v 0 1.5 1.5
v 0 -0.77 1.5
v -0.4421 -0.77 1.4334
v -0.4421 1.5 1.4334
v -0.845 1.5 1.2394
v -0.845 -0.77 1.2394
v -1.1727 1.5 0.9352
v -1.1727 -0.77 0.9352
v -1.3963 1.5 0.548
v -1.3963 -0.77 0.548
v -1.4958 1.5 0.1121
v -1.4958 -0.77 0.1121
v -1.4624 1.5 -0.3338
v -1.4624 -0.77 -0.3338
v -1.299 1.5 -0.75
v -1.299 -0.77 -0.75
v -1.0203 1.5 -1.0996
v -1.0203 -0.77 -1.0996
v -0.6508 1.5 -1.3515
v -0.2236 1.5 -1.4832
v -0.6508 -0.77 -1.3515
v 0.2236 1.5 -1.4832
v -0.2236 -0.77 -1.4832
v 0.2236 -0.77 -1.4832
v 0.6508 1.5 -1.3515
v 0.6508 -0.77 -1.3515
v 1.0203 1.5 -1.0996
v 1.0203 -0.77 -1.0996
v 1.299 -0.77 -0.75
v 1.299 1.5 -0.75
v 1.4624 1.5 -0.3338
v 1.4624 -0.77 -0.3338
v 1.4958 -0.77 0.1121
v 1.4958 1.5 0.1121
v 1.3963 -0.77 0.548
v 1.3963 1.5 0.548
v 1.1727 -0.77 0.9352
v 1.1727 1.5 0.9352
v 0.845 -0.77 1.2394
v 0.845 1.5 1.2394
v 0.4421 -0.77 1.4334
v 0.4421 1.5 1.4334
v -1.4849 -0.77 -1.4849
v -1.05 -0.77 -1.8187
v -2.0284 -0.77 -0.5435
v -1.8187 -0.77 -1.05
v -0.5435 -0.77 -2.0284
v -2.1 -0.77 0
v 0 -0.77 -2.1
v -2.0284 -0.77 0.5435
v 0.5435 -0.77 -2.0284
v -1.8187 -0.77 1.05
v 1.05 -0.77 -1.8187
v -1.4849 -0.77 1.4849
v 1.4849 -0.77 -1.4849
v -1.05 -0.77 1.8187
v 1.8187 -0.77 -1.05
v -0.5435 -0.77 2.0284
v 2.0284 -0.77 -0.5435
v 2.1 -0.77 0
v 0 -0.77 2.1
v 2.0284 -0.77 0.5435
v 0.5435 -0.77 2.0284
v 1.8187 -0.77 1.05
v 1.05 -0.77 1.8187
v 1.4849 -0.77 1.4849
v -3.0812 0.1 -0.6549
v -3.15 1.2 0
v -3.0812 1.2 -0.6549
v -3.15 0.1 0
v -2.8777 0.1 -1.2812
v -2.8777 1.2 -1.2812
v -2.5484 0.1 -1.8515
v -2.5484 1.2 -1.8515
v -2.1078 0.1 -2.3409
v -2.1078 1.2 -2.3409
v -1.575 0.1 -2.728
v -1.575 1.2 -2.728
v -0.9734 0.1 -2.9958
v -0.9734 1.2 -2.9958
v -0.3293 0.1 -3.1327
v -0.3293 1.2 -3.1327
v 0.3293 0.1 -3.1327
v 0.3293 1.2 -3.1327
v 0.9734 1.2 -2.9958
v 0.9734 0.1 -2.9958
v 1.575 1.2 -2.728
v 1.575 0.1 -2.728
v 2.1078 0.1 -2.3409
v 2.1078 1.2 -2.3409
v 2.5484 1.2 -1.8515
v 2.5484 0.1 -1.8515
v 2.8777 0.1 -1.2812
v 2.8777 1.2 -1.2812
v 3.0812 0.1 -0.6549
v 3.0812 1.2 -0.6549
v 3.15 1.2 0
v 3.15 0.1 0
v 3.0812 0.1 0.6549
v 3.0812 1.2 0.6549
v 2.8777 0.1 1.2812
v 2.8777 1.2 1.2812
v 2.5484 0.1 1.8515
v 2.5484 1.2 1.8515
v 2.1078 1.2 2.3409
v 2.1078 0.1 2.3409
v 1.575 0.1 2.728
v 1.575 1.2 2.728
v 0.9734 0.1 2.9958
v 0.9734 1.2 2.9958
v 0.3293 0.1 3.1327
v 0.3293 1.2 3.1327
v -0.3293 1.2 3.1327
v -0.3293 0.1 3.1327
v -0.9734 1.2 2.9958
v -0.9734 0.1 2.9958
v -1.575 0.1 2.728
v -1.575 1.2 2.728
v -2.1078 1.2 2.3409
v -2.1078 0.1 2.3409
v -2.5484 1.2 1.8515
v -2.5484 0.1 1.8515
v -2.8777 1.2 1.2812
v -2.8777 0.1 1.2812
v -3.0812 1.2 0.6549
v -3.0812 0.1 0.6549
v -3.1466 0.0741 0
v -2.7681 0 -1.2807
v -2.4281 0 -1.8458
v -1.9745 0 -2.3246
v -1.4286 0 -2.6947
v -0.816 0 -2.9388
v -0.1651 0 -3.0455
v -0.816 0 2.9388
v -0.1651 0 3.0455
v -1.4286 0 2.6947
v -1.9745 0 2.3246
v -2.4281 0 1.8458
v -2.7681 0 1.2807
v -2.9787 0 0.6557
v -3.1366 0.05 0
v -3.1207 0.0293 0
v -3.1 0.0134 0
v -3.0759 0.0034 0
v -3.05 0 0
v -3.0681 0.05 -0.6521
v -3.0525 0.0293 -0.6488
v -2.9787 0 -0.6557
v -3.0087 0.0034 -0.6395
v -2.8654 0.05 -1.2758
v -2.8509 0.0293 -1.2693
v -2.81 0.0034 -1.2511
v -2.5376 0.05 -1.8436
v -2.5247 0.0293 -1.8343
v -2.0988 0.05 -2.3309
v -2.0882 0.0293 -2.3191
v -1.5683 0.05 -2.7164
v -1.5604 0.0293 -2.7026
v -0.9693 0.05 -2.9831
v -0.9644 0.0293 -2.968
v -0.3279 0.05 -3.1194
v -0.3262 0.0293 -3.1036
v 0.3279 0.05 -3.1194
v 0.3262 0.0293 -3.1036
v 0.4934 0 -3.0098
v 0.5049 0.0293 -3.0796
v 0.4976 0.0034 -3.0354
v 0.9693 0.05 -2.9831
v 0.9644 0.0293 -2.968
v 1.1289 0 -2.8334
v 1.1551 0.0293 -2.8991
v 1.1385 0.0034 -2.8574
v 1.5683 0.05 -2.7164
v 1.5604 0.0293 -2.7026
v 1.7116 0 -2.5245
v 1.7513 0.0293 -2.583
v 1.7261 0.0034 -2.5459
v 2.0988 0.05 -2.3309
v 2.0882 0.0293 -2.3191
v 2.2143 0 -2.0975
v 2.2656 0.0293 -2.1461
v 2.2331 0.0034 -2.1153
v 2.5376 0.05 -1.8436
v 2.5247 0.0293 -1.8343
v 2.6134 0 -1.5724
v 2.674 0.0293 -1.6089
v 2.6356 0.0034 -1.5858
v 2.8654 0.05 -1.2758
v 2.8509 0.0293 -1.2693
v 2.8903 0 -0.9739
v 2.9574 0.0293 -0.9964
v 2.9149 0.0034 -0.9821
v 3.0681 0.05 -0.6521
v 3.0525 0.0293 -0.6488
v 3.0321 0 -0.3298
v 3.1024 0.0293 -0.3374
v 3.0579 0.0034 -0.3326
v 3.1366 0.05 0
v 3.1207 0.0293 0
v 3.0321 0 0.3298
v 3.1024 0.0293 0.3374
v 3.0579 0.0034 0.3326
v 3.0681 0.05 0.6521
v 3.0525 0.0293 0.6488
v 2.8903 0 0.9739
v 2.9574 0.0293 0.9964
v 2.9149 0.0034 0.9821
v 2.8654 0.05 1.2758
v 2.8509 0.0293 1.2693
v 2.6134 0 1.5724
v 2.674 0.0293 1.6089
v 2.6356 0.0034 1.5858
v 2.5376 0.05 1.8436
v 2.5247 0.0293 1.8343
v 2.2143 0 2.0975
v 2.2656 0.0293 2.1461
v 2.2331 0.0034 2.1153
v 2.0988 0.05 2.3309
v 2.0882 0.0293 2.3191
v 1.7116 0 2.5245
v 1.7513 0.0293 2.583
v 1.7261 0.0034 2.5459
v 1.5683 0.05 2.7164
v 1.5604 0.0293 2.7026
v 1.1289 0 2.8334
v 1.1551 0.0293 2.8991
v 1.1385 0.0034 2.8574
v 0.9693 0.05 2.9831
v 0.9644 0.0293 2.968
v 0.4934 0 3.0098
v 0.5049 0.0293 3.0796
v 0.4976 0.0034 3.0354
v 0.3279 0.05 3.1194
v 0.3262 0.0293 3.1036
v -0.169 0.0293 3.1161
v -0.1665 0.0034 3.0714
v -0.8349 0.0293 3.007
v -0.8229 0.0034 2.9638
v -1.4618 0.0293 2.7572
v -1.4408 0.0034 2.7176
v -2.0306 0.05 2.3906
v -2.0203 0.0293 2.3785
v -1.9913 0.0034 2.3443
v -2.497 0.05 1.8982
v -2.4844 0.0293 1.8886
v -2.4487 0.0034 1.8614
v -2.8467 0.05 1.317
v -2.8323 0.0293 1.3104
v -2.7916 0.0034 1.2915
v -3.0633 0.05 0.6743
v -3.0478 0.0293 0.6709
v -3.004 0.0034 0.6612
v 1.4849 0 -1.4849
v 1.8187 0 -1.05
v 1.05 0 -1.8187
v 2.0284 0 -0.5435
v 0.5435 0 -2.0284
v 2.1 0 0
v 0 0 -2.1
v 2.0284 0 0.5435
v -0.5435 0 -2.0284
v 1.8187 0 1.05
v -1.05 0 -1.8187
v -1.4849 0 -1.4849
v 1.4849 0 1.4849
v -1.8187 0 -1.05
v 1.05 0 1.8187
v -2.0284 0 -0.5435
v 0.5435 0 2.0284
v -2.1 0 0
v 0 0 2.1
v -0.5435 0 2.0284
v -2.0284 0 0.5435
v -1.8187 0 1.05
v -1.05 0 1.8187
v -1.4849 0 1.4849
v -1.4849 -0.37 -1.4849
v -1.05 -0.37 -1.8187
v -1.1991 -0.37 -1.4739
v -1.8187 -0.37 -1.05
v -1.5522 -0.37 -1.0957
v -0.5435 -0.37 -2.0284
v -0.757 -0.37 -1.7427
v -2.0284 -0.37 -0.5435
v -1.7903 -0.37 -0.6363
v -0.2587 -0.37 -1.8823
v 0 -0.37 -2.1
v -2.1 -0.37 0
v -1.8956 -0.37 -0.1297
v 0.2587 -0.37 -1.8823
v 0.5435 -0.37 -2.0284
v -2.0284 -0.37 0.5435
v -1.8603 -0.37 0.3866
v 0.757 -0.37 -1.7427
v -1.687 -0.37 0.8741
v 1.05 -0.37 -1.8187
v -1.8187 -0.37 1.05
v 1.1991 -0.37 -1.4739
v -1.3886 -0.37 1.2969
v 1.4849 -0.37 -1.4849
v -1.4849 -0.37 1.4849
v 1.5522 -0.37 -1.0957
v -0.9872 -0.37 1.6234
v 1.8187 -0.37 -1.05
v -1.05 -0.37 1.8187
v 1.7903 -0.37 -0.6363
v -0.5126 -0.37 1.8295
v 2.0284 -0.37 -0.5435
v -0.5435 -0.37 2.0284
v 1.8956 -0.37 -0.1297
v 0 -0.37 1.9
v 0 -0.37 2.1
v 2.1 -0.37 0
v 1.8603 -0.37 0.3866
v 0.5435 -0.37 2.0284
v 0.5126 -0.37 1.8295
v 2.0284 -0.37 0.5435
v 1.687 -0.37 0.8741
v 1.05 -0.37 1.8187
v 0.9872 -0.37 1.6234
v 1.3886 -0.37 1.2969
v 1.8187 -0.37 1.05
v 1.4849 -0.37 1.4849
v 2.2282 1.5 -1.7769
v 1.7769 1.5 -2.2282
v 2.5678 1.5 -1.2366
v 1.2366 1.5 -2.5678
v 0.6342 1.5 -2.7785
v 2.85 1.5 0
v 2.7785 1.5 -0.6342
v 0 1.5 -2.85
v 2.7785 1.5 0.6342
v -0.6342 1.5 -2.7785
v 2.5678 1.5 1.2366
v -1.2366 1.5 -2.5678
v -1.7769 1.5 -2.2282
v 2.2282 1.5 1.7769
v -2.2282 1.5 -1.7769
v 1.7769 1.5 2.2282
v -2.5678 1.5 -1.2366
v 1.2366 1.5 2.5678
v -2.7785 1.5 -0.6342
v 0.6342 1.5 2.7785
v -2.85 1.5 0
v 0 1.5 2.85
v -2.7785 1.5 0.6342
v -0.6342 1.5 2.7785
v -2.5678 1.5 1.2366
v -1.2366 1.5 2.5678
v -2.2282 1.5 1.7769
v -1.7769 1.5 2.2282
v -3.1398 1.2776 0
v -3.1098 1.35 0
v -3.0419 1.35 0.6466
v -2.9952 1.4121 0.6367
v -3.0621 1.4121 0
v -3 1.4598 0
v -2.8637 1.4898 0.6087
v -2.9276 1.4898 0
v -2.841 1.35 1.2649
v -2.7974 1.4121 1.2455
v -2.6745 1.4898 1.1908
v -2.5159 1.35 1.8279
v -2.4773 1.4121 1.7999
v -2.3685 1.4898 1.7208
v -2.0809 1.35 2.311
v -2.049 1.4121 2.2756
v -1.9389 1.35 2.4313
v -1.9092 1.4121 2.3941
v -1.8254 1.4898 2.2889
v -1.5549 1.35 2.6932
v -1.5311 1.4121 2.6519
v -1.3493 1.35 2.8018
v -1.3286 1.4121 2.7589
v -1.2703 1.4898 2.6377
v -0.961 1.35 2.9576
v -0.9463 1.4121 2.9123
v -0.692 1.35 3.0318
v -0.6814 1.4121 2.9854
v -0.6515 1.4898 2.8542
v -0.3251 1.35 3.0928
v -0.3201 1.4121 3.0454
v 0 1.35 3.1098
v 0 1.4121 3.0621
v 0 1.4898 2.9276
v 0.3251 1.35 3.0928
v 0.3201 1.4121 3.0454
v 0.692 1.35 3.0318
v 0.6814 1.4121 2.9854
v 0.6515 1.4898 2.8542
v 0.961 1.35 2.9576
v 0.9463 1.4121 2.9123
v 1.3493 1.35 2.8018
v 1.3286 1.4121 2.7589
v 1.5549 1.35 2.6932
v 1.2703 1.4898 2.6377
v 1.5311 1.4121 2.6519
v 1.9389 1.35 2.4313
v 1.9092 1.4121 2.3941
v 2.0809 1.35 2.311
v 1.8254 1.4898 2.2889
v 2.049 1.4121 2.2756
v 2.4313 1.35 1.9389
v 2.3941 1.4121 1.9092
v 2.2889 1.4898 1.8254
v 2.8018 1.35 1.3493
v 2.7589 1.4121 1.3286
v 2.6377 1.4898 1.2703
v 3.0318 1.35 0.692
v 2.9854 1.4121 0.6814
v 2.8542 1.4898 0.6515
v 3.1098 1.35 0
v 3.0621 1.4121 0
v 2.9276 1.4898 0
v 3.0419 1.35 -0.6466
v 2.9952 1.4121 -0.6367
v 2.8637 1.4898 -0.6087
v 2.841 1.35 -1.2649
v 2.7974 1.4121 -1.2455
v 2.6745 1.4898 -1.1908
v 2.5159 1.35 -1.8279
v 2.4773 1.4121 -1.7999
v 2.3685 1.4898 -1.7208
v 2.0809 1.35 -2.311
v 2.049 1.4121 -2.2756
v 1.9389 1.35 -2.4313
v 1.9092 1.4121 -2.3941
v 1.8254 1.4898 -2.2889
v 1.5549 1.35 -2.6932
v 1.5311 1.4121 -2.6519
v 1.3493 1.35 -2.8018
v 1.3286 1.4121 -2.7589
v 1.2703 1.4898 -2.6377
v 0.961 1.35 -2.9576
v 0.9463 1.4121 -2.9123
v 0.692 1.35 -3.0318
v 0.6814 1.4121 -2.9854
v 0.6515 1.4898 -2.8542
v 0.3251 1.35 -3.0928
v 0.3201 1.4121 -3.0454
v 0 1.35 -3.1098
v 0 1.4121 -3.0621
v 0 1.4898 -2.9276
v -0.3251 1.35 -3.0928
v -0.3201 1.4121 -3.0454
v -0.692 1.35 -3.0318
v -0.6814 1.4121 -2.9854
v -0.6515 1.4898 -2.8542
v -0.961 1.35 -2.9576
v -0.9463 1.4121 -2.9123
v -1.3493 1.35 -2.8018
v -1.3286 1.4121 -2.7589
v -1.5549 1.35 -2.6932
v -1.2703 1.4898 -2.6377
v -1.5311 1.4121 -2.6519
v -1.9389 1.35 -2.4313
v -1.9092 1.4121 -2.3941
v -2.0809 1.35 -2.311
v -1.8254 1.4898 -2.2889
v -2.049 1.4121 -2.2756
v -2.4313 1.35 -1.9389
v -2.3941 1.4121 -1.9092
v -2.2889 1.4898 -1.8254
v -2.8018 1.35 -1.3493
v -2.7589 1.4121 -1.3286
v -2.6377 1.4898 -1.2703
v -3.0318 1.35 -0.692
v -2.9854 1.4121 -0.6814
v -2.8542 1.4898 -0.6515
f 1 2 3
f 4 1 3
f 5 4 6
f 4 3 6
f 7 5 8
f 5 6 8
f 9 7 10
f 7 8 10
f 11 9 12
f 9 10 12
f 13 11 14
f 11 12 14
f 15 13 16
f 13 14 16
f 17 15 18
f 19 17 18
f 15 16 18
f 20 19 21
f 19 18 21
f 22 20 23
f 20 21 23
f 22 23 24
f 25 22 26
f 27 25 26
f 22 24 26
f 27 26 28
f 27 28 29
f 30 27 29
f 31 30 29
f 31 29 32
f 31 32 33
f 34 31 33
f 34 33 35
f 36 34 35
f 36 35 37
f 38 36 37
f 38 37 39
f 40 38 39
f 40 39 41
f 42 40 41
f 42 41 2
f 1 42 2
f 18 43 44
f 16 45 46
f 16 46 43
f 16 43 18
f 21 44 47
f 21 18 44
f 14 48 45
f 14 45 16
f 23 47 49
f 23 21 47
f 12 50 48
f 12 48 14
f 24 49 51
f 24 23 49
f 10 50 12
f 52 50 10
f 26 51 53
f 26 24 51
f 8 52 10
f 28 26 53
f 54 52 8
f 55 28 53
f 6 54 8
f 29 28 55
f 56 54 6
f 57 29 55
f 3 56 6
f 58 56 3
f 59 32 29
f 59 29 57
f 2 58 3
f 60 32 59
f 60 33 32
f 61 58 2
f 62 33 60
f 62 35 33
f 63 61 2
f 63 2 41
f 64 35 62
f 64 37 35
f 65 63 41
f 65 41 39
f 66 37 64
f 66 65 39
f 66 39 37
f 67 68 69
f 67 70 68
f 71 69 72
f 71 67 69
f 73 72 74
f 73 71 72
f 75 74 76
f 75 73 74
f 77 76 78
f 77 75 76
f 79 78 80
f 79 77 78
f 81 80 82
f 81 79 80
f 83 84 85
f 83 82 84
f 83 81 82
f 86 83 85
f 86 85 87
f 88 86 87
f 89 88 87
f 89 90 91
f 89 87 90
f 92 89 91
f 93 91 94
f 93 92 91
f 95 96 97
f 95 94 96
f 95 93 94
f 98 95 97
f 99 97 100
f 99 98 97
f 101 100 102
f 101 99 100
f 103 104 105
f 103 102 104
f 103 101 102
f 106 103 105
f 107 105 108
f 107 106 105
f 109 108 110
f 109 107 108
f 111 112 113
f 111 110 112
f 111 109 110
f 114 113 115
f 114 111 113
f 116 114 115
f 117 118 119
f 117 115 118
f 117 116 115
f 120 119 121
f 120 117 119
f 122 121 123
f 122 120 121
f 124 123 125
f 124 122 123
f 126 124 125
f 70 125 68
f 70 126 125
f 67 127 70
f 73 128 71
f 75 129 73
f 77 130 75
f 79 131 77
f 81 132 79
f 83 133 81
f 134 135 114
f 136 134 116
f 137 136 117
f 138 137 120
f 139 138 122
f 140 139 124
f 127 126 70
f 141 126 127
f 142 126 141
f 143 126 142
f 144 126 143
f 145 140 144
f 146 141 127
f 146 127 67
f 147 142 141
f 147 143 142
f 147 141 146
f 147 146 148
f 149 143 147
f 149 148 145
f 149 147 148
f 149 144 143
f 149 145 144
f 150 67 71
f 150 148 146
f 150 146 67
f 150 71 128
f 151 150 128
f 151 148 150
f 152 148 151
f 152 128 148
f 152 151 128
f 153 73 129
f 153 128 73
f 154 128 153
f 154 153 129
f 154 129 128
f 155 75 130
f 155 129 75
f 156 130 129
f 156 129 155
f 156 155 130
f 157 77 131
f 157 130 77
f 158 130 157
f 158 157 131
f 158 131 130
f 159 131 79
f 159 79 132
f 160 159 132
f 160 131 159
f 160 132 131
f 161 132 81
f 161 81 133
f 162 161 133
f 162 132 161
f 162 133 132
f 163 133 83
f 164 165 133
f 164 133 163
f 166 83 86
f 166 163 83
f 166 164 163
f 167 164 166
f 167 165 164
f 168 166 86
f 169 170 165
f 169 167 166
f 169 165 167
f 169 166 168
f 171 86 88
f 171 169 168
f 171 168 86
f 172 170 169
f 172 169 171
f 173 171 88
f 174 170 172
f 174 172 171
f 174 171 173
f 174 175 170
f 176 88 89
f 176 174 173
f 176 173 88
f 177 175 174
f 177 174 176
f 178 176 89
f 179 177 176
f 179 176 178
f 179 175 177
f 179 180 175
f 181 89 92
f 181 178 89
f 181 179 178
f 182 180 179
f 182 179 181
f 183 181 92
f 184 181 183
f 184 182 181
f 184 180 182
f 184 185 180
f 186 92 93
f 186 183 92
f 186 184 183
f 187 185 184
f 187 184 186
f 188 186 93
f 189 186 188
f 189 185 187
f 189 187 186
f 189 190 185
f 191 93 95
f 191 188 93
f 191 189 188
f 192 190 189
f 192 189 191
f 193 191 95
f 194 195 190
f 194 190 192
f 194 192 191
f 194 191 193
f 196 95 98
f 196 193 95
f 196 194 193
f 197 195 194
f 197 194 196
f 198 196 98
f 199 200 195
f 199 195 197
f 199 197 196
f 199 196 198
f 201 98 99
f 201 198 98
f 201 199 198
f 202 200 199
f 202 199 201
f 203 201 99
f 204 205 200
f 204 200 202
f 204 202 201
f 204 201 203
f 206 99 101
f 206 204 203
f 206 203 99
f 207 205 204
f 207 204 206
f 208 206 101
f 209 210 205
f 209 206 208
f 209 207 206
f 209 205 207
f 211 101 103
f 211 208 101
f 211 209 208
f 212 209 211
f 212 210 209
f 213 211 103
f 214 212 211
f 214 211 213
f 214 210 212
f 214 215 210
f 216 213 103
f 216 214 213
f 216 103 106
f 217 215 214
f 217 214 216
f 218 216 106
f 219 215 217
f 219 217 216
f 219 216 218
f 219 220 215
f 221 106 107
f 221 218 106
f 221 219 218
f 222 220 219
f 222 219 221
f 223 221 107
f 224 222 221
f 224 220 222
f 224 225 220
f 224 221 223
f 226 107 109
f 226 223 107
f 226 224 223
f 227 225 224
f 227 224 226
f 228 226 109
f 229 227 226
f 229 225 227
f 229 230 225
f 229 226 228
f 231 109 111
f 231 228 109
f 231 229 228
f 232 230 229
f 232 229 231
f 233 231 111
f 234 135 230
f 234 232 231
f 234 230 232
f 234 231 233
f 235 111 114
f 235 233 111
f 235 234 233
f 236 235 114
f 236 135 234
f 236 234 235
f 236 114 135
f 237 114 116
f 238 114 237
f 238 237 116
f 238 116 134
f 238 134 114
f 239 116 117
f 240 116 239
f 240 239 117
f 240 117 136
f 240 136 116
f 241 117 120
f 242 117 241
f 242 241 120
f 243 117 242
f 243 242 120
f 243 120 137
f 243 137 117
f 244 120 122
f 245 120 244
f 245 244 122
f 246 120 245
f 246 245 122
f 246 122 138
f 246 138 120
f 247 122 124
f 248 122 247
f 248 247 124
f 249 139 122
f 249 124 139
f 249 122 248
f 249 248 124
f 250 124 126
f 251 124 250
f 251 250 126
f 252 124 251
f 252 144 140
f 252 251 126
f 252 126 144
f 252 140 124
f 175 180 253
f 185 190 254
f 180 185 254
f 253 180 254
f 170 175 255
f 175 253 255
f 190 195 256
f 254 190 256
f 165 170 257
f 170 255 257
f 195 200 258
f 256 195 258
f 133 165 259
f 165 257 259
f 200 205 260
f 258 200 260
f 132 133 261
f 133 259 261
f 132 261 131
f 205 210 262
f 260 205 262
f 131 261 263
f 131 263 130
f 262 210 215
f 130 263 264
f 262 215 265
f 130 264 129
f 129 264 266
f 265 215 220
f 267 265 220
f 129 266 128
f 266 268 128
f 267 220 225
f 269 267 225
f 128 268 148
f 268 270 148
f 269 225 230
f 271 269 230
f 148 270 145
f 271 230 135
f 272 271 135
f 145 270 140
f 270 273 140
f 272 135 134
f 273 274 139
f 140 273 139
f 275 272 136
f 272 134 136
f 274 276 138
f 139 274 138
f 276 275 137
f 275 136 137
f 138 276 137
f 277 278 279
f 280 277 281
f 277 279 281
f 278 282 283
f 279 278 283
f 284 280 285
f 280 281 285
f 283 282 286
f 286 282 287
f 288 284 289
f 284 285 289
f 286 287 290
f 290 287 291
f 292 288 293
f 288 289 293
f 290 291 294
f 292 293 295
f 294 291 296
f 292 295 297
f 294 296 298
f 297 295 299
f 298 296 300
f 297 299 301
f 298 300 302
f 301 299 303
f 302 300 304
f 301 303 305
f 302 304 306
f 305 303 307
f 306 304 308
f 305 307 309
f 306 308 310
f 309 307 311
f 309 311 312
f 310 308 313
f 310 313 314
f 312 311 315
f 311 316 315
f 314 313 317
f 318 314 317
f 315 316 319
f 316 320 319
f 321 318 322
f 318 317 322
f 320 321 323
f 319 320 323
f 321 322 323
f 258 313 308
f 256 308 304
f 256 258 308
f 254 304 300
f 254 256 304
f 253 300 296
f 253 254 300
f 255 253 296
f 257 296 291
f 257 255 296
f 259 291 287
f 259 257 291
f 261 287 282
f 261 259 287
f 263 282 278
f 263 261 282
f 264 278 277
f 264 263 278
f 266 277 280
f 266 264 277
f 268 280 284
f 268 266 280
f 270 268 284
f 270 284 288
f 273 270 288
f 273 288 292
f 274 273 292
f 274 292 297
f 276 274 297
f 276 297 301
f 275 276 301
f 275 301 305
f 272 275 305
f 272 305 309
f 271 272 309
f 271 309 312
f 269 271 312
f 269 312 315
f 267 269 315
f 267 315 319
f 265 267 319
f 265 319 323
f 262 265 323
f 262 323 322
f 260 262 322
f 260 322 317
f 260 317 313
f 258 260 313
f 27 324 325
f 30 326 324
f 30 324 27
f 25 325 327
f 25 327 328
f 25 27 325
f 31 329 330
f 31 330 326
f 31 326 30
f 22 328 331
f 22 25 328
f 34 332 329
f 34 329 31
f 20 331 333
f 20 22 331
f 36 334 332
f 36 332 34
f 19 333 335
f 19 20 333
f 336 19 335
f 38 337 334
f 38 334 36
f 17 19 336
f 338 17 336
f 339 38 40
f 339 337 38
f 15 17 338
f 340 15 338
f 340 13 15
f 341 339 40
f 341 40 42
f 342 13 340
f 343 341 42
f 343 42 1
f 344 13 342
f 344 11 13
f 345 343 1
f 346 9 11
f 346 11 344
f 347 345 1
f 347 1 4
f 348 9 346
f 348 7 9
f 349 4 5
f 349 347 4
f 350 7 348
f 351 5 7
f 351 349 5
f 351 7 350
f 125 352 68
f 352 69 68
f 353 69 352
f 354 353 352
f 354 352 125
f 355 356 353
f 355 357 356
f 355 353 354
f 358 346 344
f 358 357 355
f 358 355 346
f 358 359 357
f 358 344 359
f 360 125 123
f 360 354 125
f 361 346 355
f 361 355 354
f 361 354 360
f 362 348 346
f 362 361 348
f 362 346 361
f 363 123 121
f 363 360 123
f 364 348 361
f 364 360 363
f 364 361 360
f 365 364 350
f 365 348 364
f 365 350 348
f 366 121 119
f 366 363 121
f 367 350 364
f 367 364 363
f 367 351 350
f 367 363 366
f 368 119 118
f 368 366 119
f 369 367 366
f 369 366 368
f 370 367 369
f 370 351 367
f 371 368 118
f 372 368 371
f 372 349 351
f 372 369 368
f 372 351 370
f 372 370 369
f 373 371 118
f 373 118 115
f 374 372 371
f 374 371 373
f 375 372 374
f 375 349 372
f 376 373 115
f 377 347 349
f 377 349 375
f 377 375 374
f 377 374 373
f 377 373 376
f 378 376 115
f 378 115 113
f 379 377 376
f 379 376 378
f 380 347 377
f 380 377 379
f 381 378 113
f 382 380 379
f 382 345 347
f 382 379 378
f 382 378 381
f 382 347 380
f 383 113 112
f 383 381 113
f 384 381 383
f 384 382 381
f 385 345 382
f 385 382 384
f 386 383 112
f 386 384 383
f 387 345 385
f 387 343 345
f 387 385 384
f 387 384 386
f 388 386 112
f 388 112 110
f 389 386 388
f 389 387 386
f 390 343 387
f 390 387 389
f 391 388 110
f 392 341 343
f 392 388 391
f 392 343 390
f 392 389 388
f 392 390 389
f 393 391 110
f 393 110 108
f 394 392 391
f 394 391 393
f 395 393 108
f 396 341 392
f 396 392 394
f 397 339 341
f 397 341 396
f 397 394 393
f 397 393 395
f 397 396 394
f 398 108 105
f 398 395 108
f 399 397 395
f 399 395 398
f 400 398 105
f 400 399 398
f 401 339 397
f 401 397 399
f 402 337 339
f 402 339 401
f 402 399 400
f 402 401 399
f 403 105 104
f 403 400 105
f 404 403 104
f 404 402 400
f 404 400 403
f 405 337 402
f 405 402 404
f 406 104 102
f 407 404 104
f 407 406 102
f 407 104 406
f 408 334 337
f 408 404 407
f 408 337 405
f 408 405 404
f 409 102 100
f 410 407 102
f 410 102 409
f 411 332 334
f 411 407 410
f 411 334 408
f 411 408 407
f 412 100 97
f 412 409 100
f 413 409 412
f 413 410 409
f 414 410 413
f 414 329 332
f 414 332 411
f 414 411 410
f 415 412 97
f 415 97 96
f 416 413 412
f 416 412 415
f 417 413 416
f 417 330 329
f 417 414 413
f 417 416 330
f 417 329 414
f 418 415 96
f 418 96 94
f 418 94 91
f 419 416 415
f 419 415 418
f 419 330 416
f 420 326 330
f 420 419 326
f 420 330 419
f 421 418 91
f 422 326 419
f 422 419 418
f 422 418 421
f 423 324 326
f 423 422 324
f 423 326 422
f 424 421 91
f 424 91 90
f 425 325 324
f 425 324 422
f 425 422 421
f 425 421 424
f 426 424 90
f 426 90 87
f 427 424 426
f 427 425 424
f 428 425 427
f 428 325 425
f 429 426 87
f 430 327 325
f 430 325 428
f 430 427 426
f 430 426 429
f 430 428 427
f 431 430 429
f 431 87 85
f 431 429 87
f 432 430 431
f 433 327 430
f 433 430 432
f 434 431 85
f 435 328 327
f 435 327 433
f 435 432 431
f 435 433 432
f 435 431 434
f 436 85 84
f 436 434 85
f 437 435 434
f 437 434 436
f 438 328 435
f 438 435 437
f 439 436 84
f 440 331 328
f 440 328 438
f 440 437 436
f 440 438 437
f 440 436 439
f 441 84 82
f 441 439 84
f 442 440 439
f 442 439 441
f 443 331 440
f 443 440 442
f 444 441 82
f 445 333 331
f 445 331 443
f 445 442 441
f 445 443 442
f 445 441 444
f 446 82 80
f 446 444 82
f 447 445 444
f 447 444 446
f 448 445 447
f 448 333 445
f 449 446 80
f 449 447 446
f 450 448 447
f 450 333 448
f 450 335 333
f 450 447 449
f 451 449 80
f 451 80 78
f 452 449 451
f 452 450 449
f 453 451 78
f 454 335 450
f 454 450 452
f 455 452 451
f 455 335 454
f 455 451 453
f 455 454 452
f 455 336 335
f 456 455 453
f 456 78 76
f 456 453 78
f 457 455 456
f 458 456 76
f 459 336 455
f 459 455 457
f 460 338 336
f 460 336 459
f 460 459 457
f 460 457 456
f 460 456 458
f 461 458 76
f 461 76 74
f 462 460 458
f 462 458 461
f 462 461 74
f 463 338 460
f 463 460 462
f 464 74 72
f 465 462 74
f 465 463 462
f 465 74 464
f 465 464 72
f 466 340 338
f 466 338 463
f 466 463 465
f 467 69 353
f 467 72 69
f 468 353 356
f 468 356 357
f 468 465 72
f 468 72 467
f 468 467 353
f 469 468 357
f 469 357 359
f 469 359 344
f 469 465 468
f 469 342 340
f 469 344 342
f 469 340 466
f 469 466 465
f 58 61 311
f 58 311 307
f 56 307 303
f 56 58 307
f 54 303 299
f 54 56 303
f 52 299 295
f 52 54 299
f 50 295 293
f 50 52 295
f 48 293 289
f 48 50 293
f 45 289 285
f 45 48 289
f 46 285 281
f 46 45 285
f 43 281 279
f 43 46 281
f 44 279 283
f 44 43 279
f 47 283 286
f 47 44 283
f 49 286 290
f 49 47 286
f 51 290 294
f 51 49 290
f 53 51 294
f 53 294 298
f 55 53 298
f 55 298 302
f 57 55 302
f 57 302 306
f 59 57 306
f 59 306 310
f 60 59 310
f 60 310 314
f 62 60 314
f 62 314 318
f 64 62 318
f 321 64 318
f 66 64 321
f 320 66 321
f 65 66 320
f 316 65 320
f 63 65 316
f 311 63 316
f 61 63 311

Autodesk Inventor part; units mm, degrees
ref_plane "YZ Plane" through (0, 0, 0) normal (1, 0, 0) x (0, 1, 0)
ref_plane "XZ Plane" through (0, 0, 0) normal (0, 1, 0) x (-1, 0, 0)
ref_plane "XY Plane" through (0, 0, 0) normal (0, 0, 1) x (1, 0, 0)
sketch "スケッチ1" plane through (0, 0, 0) normal (0, 1, 0) x (-1, 0, 0)
  circle A0 centre (0, 0) radius 3.15
  dimension "d0" = 6.3
extrude "押し出し1" add sketch "スケッチ1" along normal blind 1.5
sketch "スケッチ2" plane through (0, 0, 0) normal (0, -1, 0) x (1, 0, 0)
  circle A0 centre (0, 0) radius 2.1
  dimension "d3" = 4.2
extrude "押し出し2" add sketch "スケッチ2" along normal blind 0.77
sketch "スケッチ3" plane through (0, 1.5, 0) normal (0, 1, 0) x (1, 0, 0)
  point P0 (0, 0)
  point P1 (0, 0)
hole "穴1" at (0, 1.5, 0) direction (0, -1, 0) diameter 3 end through all
thread "ねじ1" size "M3x0.5" class "6H" standard "ANSI Metric M Profile" full length
fillet "フィレット1" radius 0.3 1 edges at (3.15, 1.5, 0)
fillet "フィレット1" radius 0.1 1 edges at (3.15, 0, 0)
sketch "スケッチ4" plane through (0, 0, 0) normal (1, 0, 0) x (0, 1, 0)
  line L0 (-0.77, 2.1) -> (-0.77, -2.1) projected
  line L1 (-0.77, 2.1) -> (-0.37, 1.9)
  line L2 (-0.37, 1.9) -> (-0.37, 2.1)
  line L3 (-0.37, 2.1) -> (-0.77, 2.1)
  line L4 (-1.956, 0) -> (2.076, 0) projected
  point P0 (0, 0)
  dimension "d17" = 0.4
  dimension "d18" = 0.2
revolve "回転1" cut sketch "スケッチ4" angle 360 about axis through (0, -10, 0) along (0, 1, 0)
properties part number "ClinchingNut_M3T1.5_Slab0.8"
